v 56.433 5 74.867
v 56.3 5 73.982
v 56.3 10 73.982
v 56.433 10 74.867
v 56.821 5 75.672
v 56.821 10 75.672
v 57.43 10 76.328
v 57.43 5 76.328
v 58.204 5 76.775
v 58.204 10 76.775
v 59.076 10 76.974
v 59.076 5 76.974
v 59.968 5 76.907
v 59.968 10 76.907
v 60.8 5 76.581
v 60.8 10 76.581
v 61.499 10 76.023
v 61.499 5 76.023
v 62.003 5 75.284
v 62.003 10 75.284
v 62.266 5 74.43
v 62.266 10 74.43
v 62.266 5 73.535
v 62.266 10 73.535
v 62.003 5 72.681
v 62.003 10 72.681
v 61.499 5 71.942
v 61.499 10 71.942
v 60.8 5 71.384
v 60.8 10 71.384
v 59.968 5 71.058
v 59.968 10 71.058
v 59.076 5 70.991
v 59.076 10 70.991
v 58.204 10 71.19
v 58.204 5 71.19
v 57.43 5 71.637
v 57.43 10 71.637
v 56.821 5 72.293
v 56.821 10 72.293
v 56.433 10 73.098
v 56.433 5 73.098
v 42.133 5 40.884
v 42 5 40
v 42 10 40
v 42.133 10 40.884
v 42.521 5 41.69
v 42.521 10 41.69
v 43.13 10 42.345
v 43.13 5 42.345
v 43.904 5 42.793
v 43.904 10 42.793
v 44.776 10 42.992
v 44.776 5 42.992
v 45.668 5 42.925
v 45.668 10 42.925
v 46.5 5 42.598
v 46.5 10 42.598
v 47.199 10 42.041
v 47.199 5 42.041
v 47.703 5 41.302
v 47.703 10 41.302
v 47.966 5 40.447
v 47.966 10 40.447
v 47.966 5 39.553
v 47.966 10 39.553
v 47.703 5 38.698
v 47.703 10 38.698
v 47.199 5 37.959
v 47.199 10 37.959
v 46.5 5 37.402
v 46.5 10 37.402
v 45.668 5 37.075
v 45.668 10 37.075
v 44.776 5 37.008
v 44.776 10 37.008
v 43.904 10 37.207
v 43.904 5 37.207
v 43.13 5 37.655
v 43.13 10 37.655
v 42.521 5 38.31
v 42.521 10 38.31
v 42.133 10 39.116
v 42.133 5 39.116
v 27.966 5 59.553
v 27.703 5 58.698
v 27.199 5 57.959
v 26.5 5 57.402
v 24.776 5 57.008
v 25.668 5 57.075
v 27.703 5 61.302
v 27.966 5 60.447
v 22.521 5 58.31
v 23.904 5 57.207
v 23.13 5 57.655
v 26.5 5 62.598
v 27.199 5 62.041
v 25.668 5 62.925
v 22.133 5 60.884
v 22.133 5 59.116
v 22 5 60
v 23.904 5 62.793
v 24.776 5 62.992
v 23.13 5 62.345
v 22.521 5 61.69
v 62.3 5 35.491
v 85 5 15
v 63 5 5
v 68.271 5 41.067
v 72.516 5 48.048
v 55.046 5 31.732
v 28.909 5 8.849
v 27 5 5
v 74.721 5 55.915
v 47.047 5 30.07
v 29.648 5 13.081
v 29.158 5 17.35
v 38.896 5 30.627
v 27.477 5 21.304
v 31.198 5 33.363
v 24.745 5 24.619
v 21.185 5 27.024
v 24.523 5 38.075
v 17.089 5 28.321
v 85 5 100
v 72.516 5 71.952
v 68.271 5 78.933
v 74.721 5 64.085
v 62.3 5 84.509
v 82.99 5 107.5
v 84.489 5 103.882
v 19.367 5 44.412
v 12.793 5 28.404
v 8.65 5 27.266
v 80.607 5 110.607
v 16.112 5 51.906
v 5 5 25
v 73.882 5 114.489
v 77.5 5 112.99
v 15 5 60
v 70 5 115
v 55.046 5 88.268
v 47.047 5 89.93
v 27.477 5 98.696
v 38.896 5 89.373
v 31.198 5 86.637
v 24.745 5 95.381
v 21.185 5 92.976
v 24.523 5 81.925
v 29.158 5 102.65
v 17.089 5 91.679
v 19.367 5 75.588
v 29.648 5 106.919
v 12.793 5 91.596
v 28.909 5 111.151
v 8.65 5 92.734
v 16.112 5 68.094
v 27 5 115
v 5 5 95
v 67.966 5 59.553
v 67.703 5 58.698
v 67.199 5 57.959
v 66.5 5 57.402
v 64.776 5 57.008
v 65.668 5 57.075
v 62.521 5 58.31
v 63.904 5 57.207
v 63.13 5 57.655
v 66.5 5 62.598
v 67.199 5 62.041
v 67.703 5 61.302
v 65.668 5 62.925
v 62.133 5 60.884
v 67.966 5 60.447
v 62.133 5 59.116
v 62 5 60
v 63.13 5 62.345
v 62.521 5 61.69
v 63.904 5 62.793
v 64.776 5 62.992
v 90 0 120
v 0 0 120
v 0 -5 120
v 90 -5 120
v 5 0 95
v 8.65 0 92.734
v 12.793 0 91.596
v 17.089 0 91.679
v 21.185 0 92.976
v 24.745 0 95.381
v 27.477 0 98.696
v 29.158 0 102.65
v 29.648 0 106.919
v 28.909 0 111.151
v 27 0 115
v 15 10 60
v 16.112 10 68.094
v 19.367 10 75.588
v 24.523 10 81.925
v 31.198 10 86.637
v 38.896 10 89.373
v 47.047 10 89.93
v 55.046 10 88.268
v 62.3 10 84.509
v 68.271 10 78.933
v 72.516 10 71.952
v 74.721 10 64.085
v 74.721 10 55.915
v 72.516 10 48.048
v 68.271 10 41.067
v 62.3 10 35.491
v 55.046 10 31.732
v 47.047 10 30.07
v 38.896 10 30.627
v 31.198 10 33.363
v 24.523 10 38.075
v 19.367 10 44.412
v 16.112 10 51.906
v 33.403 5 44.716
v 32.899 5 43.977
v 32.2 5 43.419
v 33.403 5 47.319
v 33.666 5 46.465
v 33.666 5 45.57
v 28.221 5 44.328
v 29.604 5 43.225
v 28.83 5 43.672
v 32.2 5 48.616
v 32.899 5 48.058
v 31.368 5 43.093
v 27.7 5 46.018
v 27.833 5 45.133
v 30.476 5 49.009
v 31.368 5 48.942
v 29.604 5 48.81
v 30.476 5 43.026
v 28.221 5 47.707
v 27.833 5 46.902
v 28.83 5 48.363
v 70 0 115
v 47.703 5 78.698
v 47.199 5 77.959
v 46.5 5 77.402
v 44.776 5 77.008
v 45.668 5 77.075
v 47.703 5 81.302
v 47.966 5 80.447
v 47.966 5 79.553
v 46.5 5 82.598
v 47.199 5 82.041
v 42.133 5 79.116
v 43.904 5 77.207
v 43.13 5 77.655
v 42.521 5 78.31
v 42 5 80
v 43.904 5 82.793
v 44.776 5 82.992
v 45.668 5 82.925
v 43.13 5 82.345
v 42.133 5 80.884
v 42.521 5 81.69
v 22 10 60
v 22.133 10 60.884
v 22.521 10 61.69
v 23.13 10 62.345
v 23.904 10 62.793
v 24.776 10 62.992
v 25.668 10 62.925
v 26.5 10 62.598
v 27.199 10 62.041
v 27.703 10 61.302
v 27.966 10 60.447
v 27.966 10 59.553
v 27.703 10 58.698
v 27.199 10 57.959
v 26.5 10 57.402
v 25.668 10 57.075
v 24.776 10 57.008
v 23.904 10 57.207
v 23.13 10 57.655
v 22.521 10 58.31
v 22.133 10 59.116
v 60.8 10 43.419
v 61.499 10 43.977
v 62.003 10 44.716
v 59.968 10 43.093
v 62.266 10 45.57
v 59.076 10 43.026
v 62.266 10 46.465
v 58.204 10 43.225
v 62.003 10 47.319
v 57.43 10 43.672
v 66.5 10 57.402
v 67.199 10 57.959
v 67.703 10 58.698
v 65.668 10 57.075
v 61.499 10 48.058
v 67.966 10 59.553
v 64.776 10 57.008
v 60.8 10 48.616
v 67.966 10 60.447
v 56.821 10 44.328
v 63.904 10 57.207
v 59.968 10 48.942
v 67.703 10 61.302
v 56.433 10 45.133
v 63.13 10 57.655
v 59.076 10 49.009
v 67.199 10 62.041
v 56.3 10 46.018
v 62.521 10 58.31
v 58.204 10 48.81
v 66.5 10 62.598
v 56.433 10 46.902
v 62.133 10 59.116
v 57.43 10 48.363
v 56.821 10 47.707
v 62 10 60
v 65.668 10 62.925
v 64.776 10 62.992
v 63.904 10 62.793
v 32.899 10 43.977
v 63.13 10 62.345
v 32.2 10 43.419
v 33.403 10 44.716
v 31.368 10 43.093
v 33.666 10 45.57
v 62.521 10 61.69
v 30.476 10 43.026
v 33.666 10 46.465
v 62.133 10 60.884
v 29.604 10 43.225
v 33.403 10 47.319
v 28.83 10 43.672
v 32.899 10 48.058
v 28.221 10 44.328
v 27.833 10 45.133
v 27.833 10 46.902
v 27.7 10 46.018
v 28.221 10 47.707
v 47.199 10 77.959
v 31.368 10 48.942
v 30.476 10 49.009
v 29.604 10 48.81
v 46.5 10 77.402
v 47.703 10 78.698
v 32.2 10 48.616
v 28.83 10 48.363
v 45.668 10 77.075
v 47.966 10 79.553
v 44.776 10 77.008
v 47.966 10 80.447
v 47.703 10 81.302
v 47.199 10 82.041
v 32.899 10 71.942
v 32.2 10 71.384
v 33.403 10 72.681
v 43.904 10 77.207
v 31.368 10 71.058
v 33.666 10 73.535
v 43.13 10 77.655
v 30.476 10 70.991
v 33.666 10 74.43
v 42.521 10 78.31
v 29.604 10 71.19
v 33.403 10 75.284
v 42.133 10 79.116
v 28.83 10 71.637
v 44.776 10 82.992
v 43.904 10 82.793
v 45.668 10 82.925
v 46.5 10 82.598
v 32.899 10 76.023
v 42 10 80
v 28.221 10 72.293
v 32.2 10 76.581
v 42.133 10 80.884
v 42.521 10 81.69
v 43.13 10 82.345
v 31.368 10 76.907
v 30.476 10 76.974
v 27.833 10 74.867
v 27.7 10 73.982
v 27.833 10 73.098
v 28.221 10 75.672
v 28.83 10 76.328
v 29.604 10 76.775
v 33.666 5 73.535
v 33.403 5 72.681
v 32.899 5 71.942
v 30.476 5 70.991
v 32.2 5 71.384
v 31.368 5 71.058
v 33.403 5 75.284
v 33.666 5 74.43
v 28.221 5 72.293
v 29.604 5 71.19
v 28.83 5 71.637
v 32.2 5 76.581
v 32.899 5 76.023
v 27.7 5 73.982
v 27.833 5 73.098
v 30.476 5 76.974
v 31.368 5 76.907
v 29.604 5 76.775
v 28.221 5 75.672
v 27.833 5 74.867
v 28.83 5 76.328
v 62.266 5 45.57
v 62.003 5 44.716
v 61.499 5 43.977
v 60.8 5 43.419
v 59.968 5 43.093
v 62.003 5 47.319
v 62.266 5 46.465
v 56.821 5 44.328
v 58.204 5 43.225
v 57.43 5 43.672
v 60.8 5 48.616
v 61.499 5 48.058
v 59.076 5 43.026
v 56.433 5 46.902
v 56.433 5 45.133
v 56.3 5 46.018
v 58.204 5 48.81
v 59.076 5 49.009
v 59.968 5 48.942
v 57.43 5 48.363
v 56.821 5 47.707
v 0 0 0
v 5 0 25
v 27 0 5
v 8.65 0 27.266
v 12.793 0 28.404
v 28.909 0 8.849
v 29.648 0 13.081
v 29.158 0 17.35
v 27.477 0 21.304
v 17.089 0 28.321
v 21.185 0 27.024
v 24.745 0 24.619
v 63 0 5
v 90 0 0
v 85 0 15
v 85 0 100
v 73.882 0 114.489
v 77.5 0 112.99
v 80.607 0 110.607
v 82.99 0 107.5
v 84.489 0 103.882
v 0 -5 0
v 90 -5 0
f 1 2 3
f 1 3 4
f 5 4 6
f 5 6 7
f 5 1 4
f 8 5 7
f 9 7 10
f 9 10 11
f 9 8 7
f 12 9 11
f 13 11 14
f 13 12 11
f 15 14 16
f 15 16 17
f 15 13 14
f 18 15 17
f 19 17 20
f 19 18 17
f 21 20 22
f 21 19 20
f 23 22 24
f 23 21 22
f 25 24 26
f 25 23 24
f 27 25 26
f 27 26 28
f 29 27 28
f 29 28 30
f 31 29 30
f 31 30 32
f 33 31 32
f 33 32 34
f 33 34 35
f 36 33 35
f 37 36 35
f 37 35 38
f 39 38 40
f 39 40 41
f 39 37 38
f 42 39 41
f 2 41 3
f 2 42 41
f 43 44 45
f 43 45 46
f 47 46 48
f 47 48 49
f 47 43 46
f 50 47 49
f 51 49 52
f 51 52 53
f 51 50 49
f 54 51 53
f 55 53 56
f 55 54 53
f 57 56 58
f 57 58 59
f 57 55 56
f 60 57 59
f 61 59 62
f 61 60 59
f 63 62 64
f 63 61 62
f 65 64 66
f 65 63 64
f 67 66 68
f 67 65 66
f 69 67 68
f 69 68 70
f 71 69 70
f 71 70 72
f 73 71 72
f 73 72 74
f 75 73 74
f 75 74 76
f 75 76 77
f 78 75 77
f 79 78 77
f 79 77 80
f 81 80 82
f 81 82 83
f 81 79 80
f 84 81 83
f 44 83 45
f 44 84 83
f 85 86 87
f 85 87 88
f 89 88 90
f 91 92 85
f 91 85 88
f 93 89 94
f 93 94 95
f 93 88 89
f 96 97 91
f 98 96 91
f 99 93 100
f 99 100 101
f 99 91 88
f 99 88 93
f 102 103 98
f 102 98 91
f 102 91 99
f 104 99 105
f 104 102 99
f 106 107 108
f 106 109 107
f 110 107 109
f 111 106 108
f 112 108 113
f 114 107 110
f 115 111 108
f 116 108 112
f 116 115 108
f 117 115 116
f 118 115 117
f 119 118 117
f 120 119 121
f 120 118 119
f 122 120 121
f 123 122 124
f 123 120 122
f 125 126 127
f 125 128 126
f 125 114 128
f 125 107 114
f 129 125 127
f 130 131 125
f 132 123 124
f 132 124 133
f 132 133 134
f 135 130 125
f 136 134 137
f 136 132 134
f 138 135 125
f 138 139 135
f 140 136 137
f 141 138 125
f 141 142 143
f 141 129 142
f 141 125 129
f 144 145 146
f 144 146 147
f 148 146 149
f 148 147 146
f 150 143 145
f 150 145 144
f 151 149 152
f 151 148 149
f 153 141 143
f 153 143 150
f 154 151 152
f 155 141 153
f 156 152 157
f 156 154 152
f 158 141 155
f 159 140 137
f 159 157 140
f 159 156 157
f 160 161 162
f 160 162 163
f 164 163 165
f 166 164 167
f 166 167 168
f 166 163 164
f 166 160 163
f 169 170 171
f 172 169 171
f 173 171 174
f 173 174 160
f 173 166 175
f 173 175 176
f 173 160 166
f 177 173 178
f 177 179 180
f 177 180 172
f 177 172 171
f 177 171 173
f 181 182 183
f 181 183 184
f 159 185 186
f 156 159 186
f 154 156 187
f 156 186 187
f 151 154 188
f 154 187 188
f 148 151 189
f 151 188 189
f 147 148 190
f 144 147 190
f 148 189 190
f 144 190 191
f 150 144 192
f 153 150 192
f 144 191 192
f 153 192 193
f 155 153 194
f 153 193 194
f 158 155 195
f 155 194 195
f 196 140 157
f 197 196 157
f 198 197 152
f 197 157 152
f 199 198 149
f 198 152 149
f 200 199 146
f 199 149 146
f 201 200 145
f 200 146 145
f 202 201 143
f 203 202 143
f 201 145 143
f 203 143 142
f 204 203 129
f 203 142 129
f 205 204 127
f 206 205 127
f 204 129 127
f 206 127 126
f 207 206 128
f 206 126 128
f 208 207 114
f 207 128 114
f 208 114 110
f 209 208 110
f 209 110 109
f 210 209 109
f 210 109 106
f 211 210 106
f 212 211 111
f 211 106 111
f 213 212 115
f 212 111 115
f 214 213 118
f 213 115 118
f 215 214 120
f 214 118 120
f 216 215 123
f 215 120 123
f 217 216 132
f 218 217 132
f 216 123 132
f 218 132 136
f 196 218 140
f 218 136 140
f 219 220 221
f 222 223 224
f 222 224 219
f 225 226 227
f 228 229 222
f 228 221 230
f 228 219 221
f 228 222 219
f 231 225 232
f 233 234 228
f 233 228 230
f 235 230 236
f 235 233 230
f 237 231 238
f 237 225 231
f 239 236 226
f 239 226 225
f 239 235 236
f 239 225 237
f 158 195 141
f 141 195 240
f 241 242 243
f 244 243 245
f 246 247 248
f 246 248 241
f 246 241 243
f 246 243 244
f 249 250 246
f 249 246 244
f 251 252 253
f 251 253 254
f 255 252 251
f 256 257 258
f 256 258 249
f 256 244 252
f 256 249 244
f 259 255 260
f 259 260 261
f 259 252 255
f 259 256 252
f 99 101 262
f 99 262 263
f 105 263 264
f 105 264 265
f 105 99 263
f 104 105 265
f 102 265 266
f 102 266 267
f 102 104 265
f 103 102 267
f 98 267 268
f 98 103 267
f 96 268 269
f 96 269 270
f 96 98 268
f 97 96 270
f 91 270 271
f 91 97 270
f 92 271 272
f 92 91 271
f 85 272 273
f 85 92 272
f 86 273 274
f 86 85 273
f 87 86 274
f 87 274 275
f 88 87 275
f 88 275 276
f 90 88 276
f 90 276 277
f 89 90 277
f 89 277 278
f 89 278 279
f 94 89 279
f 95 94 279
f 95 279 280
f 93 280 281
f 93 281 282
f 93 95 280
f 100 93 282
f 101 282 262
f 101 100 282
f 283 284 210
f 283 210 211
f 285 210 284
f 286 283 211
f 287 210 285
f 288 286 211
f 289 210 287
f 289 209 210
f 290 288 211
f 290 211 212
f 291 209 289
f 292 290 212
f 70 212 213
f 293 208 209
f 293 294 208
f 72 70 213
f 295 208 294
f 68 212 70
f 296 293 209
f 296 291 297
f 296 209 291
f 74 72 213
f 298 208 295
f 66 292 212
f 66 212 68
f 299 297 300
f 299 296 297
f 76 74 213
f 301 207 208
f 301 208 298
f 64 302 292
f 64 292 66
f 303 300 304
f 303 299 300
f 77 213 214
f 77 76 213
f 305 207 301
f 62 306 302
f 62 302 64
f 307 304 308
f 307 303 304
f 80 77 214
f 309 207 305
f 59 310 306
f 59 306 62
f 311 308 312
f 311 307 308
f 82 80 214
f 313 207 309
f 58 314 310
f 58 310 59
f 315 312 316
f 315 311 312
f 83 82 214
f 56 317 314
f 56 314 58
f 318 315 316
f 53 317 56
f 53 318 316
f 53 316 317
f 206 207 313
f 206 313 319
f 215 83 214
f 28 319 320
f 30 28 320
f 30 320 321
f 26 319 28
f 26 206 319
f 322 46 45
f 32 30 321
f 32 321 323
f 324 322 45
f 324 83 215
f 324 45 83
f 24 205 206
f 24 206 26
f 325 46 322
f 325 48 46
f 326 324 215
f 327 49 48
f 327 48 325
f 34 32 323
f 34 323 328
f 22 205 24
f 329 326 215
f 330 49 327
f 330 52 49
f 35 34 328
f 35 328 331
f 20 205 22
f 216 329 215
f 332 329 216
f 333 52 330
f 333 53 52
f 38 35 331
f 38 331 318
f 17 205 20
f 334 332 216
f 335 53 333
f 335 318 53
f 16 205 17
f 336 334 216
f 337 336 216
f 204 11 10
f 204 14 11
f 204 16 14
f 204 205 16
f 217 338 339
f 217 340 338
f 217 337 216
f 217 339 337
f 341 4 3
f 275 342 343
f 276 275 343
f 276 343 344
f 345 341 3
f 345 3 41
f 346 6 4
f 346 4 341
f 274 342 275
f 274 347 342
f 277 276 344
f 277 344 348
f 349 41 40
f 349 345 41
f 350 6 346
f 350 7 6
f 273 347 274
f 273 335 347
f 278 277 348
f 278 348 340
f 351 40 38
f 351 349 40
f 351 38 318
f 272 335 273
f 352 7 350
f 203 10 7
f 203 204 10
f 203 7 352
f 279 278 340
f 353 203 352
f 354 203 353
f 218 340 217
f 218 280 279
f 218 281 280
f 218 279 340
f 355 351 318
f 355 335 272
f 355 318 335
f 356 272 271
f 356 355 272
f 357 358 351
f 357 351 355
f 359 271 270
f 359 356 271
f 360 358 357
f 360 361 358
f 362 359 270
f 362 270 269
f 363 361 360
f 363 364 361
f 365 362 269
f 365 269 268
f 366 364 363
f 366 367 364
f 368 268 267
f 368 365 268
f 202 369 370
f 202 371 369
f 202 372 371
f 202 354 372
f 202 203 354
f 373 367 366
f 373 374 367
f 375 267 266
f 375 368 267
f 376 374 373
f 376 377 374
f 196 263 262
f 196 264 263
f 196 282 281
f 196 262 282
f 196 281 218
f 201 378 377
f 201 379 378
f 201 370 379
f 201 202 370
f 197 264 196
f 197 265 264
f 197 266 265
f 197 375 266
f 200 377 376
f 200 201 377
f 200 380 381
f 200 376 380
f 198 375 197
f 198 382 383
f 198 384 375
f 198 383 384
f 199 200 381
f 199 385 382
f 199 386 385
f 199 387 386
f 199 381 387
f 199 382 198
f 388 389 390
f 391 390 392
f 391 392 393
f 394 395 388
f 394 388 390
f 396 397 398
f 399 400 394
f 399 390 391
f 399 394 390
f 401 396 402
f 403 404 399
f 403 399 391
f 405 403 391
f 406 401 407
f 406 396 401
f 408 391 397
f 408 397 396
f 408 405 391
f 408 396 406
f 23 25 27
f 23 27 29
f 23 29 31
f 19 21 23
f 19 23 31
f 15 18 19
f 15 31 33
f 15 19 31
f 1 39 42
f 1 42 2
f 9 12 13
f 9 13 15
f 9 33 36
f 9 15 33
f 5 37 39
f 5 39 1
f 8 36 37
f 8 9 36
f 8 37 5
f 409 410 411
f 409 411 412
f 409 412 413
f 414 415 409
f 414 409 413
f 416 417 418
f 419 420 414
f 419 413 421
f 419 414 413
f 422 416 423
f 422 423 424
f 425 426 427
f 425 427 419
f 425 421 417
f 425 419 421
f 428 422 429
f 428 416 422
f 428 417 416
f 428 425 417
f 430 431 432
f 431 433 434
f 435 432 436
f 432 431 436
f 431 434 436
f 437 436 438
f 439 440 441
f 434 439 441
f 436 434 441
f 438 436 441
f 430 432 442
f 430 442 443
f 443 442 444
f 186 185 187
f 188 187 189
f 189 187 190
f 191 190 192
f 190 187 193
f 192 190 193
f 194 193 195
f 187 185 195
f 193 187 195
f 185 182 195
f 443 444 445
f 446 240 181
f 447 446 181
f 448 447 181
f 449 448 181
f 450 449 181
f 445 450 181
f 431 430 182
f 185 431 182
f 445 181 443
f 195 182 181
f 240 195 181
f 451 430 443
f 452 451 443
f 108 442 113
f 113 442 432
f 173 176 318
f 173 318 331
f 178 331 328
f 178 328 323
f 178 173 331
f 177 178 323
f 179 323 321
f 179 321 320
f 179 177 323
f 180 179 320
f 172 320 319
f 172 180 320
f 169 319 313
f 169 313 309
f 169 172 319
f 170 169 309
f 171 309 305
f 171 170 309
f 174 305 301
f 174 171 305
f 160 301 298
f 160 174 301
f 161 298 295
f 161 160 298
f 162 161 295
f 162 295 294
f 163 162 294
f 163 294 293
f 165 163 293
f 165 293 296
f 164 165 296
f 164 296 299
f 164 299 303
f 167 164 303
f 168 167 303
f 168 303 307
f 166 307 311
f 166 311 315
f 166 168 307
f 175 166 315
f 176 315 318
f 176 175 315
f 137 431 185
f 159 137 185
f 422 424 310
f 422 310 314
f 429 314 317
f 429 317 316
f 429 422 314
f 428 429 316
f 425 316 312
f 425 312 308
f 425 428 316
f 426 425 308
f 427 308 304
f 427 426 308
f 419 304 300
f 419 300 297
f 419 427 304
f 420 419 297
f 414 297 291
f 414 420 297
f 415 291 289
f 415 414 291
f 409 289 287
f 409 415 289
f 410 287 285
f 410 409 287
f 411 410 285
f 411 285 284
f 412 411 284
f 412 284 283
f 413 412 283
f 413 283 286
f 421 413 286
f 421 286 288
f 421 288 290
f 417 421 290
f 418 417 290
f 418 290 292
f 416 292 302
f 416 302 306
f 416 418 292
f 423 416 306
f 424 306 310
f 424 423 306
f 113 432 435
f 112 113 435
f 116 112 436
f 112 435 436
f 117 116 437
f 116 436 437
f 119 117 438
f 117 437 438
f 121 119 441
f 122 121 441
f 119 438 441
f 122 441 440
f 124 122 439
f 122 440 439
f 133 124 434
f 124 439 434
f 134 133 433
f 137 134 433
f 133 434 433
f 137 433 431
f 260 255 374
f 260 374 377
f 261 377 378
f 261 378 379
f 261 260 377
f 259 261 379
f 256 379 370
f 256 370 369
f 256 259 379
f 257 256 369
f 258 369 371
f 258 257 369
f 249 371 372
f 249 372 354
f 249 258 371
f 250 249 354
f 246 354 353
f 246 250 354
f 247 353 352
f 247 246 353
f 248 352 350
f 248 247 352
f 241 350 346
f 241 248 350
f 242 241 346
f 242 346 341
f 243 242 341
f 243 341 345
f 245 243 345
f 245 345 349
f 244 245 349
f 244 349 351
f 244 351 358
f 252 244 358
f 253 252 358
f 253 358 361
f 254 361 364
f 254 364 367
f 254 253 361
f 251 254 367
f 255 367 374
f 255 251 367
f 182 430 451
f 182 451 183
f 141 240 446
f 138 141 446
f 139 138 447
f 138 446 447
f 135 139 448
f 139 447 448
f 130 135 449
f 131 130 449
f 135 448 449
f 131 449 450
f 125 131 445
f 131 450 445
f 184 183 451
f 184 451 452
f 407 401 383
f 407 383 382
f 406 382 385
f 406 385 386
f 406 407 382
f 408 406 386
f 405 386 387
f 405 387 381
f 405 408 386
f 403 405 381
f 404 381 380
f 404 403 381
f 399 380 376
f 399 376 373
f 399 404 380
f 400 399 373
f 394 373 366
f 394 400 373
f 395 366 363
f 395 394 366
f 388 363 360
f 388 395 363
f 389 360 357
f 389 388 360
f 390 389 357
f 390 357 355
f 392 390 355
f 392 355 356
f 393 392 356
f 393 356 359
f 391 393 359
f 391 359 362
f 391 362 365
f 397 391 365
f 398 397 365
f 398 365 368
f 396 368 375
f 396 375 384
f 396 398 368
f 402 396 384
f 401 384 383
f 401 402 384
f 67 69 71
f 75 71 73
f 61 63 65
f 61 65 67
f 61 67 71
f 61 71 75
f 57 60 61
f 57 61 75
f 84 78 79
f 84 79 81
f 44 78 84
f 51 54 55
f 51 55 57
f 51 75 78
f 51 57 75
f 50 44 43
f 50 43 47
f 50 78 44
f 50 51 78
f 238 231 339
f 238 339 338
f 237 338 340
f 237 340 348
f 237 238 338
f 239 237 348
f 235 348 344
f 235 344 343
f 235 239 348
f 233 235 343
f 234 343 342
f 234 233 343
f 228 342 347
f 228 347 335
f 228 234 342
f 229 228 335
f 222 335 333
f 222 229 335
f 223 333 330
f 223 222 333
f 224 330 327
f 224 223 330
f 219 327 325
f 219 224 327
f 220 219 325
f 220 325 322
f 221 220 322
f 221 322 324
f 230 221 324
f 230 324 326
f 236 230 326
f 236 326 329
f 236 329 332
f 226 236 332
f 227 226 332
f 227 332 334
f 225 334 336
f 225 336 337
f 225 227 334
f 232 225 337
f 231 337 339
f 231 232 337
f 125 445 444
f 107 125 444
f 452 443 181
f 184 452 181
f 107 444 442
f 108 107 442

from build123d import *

# Parameters (mm, degrees)
F0_W     = 90
F0_H     = 120
F1_DEPTH = 5
F3_DEPTH = 5
F4_R     = 30
F4_R_2   = 3
F5_DEPTH = 5


with BuildPart() as f1:
    # F0 (on Front) → F1 (new body)
    with BuildSketch(Plane.XZ):
        with Locations((45, 60)):
            Rectangle(F0_W, F0_H)
    extrude(amount=F1_DEPTH)

    # F2 (on face) → F3 (join)
    with BuildSketch(Plane(origin=(0, 0, 0), x_dir=(-1, 0, 0), z_dir=(0, 1, 0))):
        with BuildLine():
            Line((-85, 15), (-63, 5))
            Line((-63, 5), (-27, 5))
            ThreePointArc((-27, 5), (-24.744746, 24.619221), (-5, 25))
            Line((-5, 25), (-5, 95))
            ThreePointArc((-5, 95), (-24.744746, 95.380779), (-27, 115))
            Line((-27, 115), (-70, 115))
            ThreePointArc((-70, 115), (-80.606602, 110.606602), (-85, 100))
            Line((-85, 100), (-85, 15))
        make_face()
    extrude(amount=F3_DEPTH)

    # F4 (on face) → F5 (join)
    with BuildSketch(Plane(origin=(0, 5, 0), x_dir=(-1, 0, 0), z_dir=(0, 1, 0))):
        with Locations((-45, 60)):
            Circle(F4_R)
        with Locations((-59.3, 46.017511)):
            Circle(F4_R_2, mode=Mode.SUBTRACT)
        with Locations((-45, 40)):
            Circle(F4_R_2, mode=Mode.SUBTRACT)
        with Locations((-30.7, 46.017511)):
            Circle(F4_R_2, mode=Mode.SUBTRACT)
        with Locations((-65, 60)):
            Circle(F4_R_2, mode=Mode.SUBTRACT)
        with Locations((-59.3, 73.982489)):
            Circle(F4_R_2, mode=Mode.SUBTRACT)
        with Locations((-45, 80)):
            Circle(F4_R_2, mode=Mode.SUBTRACT)
        with Locations((-30.7, 73.982489)):
            Circle(F4_R_2, mode=Mode.SUBTRACT)
        with Locations((-25, 60)):
            Circle(F4_R_2, mode=Mode.SUBTRACT)
    extrude(amount=F5_DEPTH)


solid = f1.part
